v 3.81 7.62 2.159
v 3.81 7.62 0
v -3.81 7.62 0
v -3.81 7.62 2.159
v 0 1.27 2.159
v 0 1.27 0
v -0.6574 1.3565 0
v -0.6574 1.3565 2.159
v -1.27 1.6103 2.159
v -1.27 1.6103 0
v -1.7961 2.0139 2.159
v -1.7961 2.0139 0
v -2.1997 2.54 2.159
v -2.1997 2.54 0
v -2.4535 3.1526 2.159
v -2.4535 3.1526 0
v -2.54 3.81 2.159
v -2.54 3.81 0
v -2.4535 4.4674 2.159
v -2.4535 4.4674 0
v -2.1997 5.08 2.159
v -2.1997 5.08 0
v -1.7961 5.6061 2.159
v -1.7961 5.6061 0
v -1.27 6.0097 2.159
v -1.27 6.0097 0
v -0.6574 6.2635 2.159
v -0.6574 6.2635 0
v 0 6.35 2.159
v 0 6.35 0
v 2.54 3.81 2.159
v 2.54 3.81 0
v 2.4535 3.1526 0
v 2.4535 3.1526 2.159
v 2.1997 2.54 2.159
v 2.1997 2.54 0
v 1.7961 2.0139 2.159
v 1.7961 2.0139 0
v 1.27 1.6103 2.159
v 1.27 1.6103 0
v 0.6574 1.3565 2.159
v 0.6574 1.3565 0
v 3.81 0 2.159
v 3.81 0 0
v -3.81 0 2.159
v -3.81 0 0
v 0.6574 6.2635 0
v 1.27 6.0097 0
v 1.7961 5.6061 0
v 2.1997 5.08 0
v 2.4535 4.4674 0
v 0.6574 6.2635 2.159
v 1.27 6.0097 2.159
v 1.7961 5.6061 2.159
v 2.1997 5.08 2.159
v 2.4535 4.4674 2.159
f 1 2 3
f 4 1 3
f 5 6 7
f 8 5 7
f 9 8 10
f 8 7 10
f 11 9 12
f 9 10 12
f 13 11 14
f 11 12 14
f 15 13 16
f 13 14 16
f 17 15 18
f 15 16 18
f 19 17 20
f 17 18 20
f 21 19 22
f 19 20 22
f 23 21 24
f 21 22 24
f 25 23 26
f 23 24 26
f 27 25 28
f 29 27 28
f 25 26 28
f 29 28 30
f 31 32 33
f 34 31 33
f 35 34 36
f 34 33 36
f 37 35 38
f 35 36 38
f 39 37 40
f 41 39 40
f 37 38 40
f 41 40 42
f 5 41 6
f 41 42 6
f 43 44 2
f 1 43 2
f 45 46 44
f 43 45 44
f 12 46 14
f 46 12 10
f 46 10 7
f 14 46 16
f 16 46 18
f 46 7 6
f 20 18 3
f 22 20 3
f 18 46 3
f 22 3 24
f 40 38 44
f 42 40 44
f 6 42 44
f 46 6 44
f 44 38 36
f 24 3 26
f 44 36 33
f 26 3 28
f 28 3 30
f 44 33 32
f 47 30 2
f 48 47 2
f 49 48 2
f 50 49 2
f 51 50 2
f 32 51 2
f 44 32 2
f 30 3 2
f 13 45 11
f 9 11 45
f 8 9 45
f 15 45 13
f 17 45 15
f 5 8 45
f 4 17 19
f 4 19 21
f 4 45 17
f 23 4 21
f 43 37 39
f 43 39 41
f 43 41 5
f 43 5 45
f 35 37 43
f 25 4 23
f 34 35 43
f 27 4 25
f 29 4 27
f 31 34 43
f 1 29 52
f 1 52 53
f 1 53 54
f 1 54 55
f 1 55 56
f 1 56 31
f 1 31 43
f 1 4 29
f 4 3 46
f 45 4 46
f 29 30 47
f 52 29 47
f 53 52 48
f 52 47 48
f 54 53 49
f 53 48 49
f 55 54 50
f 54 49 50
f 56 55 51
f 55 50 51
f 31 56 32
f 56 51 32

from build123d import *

# Parameters (mm, degrees)
F1_DEPTH = 2.159


with BuildPart() as f1:
    # F0 (on Top) → F1 (new body)
    with BuildSketch(Plane.XY):
        with BuildLine():
            Line((-3.81, 0), (0, 0))
            Line((0, 0), (0, 1.27))
            ThreePointArc((0, 1.27), (-2.54, 3.81), (0, 6.35))
            Line((0, 6.35), (0, 7.62))
            Line((0, 7.62), (-3.81, 7.62))
            Line((-3.81, 7.62), (-3.81, 0))
        make_face()
        with BuildLine():
            Line((0, 1.27), (0, 0))
            Line((0, 0), (3.81, 0))
            Line((3.81, 0), (3.81, 7.62))
            Line((3.81, 7.62), (0, 7.62))
            Line((0, 7.62), (0, 6.35))
            ThreePointArc((0, 6.35), (1.796051, 5.606051), (2.54, 3.81))
            ThreePointArc((2.54, 3.81), (1.796051, 2.013949), (0, 1.27))
        make_face()
    extrude(amount=F1_DEPTH)


solid = f1.part
